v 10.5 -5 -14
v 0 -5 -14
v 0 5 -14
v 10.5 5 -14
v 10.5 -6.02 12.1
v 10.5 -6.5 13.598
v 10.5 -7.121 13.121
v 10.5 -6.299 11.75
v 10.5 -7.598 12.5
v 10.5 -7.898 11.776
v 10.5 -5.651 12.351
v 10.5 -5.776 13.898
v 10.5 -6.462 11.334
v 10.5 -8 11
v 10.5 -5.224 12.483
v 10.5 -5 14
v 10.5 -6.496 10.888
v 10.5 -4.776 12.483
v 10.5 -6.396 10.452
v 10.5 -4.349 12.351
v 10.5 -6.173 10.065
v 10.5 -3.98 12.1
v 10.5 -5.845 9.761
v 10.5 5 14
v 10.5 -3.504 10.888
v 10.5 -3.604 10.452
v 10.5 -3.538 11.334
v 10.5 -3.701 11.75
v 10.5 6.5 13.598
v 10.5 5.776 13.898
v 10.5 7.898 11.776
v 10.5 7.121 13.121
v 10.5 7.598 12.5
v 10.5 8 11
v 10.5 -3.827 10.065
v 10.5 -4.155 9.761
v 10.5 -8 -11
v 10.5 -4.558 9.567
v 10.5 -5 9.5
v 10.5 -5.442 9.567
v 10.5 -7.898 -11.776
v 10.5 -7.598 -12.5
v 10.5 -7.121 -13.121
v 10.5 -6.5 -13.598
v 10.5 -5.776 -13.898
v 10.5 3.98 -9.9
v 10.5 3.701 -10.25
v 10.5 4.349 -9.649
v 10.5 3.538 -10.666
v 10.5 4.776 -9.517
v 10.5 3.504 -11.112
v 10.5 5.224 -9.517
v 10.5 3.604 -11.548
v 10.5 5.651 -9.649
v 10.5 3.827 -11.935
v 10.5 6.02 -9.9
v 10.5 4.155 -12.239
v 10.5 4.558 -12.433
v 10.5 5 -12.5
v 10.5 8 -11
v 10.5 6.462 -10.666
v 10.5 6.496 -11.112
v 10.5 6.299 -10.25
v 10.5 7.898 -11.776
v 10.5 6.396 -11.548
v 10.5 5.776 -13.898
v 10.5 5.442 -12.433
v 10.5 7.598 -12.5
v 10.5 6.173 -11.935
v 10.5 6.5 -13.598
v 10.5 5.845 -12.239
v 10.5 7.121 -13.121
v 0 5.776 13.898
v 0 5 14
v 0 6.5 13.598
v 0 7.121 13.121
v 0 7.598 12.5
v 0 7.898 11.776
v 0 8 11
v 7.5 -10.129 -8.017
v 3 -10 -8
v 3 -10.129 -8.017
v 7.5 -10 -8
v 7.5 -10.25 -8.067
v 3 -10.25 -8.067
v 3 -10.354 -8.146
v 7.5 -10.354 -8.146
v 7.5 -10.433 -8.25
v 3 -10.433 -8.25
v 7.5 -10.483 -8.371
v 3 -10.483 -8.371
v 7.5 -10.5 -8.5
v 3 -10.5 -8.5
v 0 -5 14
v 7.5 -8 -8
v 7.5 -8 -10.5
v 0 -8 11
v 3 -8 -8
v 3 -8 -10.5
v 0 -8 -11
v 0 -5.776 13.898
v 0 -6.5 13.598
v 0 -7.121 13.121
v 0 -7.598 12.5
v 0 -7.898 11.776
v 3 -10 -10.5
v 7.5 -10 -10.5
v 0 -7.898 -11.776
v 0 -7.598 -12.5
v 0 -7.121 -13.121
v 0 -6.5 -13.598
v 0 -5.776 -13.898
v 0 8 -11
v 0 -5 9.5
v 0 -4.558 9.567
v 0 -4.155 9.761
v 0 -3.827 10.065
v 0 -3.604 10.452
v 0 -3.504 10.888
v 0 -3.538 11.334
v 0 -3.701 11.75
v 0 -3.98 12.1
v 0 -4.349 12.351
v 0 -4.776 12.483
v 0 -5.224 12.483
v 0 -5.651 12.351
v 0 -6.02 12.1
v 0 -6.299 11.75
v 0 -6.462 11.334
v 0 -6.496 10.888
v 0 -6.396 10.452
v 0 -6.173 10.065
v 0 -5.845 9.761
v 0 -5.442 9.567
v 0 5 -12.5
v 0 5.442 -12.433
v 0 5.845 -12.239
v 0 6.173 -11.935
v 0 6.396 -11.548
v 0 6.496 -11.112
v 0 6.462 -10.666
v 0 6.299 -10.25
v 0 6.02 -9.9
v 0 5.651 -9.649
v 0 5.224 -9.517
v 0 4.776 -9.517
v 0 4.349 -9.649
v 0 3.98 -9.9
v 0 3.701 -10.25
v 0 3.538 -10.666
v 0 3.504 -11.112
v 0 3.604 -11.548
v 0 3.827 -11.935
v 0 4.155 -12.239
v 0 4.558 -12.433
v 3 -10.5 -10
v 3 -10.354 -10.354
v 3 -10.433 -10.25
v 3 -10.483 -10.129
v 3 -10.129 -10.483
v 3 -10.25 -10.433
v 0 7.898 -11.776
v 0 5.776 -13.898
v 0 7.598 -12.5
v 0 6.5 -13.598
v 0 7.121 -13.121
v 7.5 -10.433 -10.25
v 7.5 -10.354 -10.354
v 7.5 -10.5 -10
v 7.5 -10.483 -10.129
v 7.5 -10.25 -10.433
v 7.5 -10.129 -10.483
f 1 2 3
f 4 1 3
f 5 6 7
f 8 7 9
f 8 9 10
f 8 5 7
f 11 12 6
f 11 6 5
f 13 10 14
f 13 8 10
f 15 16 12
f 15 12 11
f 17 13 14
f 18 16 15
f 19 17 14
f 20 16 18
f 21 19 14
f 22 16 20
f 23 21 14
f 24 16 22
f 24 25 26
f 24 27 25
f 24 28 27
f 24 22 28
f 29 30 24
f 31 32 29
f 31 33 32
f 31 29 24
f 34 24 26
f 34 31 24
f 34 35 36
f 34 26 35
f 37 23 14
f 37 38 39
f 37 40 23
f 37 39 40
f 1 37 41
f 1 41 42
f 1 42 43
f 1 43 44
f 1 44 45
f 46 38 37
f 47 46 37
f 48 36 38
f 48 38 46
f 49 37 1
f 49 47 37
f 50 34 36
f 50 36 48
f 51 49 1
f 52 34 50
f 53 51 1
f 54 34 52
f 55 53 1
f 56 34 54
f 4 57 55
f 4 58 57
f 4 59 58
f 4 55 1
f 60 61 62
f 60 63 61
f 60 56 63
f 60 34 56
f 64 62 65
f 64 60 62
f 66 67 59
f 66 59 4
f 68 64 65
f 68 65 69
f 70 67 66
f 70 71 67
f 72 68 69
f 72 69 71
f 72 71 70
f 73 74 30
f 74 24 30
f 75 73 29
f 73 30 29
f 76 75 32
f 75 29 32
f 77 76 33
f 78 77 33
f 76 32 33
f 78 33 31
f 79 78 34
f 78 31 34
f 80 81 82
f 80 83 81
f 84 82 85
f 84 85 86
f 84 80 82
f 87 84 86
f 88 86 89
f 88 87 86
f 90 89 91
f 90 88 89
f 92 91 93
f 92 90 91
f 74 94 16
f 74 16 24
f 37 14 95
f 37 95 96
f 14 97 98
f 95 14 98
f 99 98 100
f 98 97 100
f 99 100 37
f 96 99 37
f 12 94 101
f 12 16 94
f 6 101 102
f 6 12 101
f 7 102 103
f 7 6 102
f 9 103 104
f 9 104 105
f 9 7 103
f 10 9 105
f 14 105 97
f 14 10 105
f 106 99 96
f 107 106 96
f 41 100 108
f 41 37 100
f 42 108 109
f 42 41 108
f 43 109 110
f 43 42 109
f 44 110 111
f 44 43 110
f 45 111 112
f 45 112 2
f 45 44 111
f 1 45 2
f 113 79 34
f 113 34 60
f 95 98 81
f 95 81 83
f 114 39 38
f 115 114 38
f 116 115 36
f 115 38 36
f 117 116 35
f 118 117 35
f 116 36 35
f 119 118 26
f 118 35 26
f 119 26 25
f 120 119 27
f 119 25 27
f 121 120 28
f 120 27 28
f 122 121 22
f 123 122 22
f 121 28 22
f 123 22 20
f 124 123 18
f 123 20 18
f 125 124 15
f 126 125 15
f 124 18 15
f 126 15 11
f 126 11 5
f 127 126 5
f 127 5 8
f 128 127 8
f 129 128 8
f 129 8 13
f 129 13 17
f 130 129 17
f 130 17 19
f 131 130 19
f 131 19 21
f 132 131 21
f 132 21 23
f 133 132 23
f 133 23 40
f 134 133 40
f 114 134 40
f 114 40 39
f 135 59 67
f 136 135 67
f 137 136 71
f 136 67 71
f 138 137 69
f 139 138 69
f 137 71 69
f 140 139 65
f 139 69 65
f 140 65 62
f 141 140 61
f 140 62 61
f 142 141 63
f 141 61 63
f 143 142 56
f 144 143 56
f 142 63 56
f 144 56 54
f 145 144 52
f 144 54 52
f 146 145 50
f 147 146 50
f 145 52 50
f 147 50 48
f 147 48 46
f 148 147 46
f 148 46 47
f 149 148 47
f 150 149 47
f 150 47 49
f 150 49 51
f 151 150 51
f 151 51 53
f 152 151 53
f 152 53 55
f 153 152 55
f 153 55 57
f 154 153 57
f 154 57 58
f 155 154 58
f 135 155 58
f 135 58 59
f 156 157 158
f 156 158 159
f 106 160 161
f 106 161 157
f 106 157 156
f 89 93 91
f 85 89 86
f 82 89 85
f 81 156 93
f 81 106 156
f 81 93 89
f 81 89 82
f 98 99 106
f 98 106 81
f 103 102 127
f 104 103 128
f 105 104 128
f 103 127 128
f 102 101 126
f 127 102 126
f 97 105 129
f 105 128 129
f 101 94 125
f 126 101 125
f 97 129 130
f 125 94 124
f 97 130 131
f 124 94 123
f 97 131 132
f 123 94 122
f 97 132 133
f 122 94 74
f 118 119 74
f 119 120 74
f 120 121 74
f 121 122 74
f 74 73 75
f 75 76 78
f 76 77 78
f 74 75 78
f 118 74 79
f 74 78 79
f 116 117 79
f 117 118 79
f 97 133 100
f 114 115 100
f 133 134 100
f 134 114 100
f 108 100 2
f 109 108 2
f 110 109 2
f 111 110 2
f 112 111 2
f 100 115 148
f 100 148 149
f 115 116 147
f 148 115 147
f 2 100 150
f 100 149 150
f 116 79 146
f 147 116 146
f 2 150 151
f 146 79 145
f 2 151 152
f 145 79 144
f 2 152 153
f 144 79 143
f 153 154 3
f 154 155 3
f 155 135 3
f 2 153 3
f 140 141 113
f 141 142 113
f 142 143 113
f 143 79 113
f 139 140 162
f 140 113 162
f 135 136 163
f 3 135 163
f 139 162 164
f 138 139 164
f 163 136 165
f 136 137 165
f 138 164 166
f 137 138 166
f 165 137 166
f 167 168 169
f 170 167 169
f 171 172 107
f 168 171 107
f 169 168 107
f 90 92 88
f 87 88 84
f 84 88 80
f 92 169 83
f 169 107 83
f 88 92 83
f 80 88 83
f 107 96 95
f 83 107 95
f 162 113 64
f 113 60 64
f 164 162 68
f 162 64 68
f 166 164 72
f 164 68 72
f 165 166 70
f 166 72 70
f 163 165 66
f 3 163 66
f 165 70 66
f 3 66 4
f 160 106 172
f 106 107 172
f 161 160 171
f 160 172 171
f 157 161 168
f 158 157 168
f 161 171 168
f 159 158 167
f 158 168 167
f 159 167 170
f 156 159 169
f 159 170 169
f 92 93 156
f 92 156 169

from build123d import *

# Parameters (mm, degrees)
SKETCH1_W           = 28
SKETCH1_H           = 16
BOSS_EXTRUDE1_DEPTH = 10.5
SKETCH2_R           = 1.5
CUT_EXTRUDE1_DEPTH  = 20.241881405
FILLET1_R           = 3
SKETCH3_W           = 4.5
SKETCH3_H           = 2.5
BOSS_EXTRUDE2_DEPTH = 2.5
FILLET2_R           = 0.5


with BuildPart() as part:
    # Sketch1 → Boss-Extrude1 (new body)
    with BuildSketch(Plane(origin=(0, 0, 0), x_dir=(0, 0, -1), z_dir=(1, 0, 0))):
        Rectangle(SKETCH1_W, SKETCH1_H)
    extrude(amount=BOSS_EXTRUDE1_DEPTH)

    # Sketch2 → Cut-Extrude1 (cut, through all)
    with BuildSketch(Plane(origin=(10.5, 0, 0), x_dir=(0, 0, -1), z_dir=(1, 0, 0))):
        with Locations((11, 5)):
            Circle(SKETCH2_R)
        with Locations((-11, -5)):
            Circle(SKETCH2_R)
    extrude(amount=-CUT_EXTRUDE1_DEPTH, mode=Mode.SUBTRACT)

    # Fillet1
    fillet1_edges = [part.edges().sort_by_distance(p)[0] for p in [
        (5.25, -8, -14),
        (5.25, -8, 14),
        (5.25, 8, 14),
        (5.25, 8, -14),
    ]]
    fillet(fillet1_edges, radius=FILLET1_R)

    # Sketch3 → Boss-Extrude2 (add)
    with BuildSketch(Plane.XZ.offset(8)):
        with Locations((5.25, -9.25)):
            Rectangle(SKETCH3_W, SKETCH3_H)
    extrude(amount=BOSS_EXTRUDE2_DEPTH)

    # Fillet2
    fillet2_edges = [part.edges().sort_by_distance(p)[0] for p in [
        (5.25, -10.5, -10.5),
        (5.25, -10.5, -8),
    ]]
    fillet(fillet2_edges, radius=FILLET2_R)


solid = part.part
